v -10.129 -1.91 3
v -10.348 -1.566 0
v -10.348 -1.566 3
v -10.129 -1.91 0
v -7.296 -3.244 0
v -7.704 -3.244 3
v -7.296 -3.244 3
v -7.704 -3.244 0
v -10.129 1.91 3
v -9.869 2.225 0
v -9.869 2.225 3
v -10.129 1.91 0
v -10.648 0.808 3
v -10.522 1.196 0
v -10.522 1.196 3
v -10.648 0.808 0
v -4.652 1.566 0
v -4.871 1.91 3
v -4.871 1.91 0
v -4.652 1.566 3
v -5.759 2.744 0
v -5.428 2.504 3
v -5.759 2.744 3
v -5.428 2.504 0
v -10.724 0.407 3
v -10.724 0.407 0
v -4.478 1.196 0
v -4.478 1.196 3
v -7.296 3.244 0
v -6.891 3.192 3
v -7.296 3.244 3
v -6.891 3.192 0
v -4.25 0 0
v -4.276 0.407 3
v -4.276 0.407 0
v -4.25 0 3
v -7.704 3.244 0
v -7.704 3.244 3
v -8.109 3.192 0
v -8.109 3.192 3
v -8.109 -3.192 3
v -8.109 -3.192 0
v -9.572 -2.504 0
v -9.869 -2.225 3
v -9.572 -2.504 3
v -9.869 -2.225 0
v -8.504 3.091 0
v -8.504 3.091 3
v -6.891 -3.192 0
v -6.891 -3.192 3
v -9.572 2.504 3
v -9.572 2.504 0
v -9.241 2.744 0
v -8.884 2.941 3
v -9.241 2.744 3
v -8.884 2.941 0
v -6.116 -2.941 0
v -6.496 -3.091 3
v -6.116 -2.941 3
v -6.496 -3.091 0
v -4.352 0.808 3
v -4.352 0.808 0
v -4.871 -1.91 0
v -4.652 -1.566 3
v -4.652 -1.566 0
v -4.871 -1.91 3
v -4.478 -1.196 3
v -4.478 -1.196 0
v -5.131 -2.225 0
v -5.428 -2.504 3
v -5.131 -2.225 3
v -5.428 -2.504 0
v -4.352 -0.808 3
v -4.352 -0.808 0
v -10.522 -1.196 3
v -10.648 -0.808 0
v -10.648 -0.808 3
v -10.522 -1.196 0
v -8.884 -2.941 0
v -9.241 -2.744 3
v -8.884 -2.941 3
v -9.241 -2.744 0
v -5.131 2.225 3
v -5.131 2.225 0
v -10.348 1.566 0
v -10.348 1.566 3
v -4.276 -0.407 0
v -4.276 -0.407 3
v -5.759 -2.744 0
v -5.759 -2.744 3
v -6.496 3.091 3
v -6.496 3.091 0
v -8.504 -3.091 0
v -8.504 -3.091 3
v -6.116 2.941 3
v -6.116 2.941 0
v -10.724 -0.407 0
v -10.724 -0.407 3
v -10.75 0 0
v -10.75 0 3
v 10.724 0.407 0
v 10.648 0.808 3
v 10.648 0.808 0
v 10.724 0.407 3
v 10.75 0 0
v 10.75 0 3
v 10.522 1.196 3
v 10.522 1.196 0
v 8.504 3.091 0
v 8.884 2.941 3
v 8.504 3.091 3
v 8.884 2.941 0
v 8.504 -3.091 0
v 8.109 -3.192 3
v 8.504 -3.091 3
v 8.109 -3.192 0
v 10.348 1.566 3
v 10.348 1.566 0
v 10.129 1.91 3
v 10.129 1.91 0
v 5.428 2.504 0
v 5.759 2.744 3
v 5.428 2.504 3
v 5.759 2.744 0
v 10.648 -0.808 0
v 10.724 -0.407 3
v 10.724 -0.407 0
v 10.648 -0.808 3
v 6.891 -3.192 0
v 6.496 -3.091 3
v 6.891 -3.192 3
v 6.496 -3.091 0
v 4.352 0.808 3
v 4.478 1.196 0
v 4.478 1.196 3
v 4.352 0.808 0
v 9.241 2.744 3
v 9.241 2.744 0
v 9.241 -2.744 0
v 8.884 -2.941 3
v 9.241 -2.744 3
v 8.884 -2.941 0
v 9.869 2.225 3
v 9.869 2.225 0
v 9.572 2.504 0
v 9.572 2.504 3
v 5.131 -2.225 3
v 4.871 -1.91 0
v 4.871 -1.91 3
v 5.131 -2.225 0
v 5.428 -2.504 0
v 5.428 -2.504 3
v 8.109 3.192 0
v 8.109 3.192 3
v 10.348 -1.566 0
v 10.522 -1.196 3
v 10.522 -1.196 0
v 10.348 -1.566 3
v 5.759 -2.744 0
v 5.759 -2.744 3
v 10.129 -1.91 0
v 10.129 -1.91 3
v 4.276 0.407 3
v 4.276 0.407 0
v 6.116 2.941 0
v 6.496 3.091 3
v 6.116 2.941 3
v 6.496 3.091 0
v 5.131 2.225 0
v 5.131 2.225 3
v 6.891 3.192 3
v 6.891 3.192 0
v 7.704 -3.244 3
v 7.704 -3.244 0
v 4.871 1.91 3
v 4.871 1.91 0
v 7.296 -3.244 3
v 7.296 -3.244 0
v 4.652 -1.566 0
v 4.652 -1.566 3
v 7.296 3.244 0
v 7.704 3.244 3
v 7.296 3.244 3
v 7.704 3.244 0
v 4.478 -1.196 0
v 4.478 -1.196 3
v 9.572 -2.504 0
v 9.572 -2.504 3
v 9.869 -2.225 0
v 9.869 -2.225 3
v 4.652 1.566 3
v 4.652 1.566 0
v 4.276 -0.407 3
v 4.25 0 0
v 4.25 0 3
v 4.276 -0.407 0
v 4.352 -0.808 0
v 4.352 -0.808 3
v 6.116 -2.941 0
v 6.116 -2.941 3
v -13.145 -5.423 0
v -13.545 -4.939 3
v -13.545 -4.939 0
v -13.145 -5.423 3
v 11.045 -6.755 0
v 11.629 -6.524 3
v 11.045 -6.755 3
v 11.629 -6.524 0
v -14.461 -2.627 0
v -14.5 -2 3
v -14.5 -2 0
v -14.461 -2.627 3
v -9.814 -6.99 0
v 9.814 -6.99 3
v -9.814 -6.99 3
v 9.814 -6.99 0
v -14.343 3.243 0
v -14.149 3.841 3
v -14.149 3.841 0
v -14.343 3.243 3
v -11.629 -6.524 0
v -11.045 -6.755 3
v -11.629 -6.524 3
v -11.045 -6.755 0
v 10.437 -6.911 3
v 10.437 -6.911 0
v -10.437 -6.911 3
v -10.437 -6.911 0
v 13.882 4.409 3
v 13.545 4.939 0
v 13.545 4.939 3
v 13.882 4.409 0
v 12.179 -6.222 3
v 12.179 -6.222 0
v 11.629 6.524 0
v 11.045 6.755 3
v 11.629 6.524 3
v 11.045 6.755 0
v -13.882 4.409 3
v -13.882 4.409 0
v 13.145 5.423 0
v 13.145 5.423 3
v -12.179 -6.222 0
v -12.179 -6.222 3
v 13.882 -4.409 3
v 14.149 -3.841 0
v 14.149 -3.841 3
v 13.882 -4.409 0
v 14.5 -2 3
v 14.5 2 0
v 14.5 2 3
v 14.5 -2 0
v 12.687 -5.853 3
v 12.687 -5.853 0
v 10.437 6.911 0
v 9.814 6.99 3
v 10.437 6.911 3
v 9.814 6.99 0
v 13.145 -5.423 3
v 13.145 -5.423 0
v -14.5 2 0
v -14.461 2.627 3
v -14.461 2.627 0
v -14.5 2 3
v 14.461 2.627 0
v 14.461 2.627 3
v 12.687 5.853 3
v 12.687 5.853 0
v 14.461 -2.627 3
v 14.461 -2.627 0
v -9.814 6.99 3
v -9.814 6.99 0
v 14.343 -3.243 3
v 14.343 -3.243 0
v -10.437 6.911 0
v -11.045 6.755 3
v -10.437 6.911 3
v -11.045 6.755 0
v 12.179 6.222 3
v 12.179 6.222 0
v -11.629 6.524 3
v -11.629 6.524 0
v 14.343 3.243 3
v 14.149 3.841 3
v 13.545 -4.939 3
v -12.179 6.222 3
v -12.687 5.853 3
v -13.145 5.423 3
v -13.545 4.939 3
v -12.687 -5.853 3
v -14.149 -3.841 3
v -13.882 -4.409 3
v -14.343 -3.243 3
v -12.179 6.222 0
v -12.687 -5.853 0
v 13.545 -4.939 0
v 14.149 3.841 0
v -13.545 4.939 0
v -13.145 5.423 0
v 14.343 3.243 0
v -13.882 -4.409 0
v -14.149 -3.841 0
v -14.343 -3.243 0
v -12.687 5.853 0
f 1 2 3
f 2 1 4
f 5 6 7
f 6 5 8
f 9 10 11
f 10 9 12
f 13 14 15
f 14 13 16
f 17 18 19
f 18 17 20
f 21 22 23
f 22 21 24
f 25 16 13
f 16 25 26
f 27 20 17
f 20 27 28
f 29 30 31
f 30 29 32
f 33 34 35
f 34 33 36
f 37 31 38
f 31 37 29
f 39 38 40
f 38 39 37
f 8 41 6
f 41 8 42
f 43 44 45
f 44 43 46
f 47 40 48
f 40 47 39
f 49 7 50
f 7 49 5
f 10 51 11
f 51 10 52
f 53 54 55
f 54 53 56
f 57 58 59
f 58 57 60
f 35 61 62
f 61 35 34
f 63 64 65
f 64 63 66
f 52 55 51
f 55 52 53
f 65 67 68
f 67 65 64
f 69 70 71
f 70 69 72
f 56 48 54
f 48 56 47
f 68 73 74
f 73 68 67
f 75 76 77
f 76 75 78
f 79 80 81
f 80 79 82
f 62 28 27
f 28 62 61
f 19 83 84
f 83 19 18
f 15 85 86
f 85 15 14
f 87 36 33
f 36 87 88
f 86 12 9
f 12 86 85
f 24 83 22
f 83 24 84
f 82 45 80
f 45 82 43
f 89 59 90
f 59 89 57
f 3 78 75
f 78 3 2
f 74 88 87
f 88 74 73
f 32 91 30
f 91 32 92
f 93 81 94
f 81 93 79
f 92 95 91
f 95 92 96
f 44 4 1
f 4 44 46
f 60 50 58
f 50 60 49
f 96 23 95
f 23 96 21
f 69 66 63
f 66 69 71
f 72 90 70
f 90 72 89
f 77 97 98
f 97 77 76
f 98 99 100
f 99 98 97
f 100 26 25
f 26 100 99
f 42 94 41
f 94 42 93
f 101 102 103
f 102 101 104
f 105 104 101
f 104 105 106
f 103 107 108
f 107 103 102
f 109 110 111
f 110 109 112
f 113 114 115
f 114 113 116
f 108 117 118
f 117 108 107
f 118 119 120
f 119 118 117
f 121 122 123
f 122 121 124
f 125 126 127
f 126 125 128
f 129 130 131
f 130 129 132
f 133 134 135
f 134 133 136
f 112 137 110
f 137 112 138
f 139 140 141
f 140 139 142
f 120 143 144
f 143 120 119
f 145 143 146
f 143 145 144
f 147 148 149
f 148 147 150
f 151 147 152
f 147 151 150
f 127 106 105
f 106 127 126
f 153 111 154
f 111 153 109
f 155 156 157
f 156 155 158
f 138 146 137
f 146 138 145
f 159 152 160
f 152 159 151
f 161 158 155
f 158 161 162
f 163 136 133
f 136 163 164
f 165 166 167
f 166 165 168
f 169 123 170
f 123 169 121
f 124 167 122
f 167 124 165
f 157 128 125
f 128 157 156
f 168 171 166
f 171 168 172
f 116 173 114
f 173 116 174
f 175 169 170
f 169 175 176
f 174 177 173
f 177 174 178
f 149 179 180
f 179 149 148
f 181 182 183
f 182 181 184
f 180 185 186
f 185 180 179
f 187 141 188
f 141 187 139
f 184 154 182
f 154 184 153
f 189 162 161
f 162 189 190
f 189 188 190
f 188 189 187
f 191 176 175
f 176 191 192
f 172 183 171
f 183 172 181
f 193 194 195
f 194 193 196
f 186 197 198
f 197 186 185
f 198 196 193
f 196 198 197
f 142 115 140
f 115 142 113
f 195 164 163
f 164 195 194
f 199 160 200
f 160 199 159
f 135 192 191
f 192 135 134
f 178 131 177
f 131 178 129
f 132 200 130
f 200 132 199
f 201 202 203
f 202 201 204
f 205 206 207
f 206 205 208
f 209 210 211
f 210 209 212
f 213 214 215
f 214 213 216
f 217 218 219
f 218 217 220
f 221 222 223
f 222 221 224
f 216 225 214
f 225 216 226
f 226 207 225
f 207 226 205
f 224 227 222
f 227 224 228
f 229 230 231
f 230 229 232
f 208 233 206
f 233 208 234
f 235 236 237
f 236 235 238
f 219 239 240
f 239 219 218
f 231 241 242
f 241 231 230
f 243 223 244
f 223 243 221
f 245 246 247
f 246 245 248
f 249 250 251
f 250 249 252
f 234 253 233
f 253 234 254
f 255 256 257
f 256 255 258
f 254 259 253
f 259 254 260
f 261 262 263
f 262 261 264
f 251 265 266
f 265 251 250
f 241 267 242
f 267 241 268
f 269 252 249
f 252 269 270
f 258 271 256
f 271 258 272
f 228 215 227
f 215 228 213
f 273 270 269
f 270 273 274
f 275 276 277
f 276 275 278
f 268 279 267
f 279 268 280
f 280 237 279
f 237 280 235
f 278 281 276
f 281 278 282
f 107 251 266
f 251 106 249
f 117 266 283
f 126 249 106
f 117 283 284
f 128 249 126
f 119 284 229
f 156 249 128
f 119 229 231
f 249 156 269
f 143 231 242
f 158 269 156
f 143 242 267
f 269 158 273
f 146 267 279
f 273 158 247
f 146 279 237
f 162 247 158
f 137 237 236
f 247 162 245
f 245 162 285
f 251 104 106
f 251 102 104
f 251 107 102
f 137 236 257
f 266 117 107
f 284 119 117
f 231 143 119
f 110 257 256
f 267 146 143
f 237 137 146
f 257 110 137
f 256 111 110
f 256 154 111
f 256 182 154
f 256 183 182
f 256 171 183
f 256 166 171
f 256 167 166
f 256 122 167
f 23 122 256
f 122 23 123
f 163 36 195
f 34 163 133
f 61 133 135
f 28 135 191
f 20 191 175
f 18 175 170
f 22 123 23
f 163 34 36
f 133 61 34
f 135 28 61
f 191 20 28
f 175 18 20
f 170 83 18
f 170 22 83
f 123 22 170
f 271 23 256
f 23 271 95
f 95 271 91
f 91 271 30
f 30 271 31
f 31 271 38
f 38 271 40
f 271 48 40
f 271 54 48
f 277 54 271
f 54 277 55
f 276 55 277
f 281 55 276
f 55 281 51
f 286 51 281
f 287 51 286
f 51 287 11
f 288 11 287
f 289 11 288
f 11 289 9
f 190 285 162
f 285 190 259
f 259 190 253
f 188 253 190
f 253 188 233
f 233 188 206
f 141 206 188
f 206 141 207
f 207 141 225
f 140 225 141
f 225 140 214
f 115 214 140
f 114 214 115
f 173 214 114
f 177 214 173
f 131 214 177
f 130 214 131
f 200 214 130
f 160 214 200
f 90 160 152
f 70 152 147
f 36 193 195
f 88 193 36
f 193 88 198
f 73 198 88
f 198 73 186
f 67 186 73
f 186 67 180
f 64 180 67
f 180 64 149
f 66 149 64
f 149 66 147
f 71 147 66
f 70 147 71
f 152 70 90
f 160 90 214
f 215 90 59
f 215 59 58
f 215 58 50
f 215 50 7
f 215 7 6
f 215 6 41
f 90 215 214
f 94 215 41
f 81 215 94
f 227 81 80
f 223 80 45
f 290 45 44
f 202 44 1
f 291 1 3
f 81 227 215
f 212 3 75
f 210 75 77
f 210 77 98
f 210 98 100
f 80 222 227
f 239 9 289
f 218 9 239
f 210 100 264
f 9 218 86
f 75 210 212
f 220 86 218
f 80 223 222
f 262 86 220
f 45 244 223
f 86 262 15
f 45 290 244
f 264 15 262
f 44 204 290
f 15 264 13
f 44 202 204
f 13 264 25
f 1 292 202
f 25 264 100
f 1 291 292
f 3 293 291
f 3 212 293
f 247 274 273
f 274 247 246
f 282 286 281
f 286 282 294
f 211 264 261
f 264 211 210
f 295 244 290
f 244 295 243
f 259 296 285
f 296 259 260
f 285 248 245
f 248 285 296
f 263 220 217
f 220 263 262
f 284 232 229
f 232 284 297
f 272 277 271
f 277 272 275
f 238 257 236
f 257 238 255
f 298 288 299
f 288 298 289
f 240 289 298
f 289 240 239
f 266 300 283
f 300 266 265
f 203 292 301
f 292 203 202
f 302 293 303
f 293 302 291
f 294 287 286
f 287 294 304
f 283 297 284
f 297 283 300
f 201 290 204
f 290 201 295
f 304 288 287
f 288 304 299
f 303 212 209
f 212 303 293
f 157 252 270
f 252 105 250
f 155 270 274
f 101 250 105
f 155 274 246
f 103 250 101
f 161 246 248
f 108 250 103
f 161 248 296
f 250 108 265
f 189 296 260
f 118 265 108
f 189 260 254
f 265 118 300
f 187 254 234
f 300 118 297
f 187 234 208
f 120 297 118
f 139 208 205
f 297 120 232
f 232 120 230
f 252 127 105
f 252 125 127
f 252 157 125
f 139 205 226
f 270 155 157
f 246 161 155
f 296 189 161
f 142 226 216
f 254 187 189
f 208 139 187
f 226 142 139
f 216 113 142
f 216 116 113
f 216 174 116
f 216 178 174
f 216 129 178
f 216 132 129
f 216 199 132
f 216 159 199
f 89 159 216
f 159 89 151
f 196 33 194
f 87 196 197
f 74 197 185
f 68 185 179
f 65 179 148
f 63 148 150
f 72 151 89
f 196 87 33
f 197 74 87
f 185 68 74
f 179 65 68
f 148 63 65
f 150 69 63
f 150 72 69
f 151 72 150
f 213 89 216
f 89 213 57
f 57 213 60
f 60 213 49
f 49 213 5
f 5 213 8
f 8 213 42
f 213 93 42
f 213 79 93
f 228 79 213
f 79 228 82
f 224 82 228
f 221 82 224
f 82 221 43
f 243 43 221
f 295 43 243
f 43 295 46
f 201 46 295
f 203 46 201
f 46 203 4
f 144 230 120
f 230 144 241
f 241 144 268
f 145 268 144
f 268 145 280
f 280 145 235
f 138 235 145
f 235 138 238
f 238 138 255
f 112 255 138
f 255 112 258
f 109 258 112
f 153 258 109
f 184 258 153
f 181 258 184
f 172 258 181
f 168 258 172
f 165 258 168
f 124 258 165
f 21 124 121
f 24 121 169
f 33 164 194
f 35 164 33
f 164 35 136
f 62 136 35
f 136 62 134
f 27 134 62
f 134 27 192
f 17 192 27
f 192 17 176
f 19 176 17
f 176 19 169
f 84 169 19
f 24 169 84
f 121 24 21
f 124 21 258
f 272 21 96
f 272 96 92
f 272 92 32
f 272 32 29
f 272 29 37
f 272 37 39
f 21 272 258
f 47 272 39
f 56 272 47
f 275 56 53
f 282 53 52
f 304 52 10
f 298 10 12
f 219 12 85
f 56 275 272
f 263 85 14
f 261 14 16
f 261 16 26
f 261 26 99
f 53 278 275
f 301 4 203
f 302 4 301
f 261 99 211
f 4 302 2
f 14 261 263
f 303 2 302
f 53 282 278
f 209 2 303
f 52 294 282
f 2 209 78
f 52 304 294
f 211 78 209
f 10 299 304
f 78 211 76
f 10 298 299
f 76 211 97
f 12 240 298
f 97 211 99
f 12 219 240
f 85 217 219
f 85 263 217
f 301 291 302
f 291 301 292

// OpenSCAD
$fn = 50;


difference() {
	union() {
		hull() {
			translate(v = [-9.5000000000, 2.0000000000, 0]) {
				cylinder(h = 3, r = 5);
			}
			translate(v = [9.5000000000, 2.0000000000, 0]) {
				cylinder(h = 3, r = 5);
			}
			translate(v = [-9.5000000000, -2.0000000000, 0]) {
				cylinder(h = 3, r = 5);
			}
			translate(v = [9.5000000000, -2.0000000000, 0]) {
				cylinder(h = 3, r = 5);
			}
		}
	}
	union() {
		translate(v = [-7.5000000000, 0.0000000000, 0]) {
			translate(v = [0, 0, -100]) {
				cylinder(h = 200, r = 3.2500000000);
			}
		}
		translate(v = [7.5000000000, 0.0000000000, 0]) {
			translate(v = [0, 0, -100]) {
				cylinder(h = 200, r = 3.2500000000);
			}
		}
	}
}
